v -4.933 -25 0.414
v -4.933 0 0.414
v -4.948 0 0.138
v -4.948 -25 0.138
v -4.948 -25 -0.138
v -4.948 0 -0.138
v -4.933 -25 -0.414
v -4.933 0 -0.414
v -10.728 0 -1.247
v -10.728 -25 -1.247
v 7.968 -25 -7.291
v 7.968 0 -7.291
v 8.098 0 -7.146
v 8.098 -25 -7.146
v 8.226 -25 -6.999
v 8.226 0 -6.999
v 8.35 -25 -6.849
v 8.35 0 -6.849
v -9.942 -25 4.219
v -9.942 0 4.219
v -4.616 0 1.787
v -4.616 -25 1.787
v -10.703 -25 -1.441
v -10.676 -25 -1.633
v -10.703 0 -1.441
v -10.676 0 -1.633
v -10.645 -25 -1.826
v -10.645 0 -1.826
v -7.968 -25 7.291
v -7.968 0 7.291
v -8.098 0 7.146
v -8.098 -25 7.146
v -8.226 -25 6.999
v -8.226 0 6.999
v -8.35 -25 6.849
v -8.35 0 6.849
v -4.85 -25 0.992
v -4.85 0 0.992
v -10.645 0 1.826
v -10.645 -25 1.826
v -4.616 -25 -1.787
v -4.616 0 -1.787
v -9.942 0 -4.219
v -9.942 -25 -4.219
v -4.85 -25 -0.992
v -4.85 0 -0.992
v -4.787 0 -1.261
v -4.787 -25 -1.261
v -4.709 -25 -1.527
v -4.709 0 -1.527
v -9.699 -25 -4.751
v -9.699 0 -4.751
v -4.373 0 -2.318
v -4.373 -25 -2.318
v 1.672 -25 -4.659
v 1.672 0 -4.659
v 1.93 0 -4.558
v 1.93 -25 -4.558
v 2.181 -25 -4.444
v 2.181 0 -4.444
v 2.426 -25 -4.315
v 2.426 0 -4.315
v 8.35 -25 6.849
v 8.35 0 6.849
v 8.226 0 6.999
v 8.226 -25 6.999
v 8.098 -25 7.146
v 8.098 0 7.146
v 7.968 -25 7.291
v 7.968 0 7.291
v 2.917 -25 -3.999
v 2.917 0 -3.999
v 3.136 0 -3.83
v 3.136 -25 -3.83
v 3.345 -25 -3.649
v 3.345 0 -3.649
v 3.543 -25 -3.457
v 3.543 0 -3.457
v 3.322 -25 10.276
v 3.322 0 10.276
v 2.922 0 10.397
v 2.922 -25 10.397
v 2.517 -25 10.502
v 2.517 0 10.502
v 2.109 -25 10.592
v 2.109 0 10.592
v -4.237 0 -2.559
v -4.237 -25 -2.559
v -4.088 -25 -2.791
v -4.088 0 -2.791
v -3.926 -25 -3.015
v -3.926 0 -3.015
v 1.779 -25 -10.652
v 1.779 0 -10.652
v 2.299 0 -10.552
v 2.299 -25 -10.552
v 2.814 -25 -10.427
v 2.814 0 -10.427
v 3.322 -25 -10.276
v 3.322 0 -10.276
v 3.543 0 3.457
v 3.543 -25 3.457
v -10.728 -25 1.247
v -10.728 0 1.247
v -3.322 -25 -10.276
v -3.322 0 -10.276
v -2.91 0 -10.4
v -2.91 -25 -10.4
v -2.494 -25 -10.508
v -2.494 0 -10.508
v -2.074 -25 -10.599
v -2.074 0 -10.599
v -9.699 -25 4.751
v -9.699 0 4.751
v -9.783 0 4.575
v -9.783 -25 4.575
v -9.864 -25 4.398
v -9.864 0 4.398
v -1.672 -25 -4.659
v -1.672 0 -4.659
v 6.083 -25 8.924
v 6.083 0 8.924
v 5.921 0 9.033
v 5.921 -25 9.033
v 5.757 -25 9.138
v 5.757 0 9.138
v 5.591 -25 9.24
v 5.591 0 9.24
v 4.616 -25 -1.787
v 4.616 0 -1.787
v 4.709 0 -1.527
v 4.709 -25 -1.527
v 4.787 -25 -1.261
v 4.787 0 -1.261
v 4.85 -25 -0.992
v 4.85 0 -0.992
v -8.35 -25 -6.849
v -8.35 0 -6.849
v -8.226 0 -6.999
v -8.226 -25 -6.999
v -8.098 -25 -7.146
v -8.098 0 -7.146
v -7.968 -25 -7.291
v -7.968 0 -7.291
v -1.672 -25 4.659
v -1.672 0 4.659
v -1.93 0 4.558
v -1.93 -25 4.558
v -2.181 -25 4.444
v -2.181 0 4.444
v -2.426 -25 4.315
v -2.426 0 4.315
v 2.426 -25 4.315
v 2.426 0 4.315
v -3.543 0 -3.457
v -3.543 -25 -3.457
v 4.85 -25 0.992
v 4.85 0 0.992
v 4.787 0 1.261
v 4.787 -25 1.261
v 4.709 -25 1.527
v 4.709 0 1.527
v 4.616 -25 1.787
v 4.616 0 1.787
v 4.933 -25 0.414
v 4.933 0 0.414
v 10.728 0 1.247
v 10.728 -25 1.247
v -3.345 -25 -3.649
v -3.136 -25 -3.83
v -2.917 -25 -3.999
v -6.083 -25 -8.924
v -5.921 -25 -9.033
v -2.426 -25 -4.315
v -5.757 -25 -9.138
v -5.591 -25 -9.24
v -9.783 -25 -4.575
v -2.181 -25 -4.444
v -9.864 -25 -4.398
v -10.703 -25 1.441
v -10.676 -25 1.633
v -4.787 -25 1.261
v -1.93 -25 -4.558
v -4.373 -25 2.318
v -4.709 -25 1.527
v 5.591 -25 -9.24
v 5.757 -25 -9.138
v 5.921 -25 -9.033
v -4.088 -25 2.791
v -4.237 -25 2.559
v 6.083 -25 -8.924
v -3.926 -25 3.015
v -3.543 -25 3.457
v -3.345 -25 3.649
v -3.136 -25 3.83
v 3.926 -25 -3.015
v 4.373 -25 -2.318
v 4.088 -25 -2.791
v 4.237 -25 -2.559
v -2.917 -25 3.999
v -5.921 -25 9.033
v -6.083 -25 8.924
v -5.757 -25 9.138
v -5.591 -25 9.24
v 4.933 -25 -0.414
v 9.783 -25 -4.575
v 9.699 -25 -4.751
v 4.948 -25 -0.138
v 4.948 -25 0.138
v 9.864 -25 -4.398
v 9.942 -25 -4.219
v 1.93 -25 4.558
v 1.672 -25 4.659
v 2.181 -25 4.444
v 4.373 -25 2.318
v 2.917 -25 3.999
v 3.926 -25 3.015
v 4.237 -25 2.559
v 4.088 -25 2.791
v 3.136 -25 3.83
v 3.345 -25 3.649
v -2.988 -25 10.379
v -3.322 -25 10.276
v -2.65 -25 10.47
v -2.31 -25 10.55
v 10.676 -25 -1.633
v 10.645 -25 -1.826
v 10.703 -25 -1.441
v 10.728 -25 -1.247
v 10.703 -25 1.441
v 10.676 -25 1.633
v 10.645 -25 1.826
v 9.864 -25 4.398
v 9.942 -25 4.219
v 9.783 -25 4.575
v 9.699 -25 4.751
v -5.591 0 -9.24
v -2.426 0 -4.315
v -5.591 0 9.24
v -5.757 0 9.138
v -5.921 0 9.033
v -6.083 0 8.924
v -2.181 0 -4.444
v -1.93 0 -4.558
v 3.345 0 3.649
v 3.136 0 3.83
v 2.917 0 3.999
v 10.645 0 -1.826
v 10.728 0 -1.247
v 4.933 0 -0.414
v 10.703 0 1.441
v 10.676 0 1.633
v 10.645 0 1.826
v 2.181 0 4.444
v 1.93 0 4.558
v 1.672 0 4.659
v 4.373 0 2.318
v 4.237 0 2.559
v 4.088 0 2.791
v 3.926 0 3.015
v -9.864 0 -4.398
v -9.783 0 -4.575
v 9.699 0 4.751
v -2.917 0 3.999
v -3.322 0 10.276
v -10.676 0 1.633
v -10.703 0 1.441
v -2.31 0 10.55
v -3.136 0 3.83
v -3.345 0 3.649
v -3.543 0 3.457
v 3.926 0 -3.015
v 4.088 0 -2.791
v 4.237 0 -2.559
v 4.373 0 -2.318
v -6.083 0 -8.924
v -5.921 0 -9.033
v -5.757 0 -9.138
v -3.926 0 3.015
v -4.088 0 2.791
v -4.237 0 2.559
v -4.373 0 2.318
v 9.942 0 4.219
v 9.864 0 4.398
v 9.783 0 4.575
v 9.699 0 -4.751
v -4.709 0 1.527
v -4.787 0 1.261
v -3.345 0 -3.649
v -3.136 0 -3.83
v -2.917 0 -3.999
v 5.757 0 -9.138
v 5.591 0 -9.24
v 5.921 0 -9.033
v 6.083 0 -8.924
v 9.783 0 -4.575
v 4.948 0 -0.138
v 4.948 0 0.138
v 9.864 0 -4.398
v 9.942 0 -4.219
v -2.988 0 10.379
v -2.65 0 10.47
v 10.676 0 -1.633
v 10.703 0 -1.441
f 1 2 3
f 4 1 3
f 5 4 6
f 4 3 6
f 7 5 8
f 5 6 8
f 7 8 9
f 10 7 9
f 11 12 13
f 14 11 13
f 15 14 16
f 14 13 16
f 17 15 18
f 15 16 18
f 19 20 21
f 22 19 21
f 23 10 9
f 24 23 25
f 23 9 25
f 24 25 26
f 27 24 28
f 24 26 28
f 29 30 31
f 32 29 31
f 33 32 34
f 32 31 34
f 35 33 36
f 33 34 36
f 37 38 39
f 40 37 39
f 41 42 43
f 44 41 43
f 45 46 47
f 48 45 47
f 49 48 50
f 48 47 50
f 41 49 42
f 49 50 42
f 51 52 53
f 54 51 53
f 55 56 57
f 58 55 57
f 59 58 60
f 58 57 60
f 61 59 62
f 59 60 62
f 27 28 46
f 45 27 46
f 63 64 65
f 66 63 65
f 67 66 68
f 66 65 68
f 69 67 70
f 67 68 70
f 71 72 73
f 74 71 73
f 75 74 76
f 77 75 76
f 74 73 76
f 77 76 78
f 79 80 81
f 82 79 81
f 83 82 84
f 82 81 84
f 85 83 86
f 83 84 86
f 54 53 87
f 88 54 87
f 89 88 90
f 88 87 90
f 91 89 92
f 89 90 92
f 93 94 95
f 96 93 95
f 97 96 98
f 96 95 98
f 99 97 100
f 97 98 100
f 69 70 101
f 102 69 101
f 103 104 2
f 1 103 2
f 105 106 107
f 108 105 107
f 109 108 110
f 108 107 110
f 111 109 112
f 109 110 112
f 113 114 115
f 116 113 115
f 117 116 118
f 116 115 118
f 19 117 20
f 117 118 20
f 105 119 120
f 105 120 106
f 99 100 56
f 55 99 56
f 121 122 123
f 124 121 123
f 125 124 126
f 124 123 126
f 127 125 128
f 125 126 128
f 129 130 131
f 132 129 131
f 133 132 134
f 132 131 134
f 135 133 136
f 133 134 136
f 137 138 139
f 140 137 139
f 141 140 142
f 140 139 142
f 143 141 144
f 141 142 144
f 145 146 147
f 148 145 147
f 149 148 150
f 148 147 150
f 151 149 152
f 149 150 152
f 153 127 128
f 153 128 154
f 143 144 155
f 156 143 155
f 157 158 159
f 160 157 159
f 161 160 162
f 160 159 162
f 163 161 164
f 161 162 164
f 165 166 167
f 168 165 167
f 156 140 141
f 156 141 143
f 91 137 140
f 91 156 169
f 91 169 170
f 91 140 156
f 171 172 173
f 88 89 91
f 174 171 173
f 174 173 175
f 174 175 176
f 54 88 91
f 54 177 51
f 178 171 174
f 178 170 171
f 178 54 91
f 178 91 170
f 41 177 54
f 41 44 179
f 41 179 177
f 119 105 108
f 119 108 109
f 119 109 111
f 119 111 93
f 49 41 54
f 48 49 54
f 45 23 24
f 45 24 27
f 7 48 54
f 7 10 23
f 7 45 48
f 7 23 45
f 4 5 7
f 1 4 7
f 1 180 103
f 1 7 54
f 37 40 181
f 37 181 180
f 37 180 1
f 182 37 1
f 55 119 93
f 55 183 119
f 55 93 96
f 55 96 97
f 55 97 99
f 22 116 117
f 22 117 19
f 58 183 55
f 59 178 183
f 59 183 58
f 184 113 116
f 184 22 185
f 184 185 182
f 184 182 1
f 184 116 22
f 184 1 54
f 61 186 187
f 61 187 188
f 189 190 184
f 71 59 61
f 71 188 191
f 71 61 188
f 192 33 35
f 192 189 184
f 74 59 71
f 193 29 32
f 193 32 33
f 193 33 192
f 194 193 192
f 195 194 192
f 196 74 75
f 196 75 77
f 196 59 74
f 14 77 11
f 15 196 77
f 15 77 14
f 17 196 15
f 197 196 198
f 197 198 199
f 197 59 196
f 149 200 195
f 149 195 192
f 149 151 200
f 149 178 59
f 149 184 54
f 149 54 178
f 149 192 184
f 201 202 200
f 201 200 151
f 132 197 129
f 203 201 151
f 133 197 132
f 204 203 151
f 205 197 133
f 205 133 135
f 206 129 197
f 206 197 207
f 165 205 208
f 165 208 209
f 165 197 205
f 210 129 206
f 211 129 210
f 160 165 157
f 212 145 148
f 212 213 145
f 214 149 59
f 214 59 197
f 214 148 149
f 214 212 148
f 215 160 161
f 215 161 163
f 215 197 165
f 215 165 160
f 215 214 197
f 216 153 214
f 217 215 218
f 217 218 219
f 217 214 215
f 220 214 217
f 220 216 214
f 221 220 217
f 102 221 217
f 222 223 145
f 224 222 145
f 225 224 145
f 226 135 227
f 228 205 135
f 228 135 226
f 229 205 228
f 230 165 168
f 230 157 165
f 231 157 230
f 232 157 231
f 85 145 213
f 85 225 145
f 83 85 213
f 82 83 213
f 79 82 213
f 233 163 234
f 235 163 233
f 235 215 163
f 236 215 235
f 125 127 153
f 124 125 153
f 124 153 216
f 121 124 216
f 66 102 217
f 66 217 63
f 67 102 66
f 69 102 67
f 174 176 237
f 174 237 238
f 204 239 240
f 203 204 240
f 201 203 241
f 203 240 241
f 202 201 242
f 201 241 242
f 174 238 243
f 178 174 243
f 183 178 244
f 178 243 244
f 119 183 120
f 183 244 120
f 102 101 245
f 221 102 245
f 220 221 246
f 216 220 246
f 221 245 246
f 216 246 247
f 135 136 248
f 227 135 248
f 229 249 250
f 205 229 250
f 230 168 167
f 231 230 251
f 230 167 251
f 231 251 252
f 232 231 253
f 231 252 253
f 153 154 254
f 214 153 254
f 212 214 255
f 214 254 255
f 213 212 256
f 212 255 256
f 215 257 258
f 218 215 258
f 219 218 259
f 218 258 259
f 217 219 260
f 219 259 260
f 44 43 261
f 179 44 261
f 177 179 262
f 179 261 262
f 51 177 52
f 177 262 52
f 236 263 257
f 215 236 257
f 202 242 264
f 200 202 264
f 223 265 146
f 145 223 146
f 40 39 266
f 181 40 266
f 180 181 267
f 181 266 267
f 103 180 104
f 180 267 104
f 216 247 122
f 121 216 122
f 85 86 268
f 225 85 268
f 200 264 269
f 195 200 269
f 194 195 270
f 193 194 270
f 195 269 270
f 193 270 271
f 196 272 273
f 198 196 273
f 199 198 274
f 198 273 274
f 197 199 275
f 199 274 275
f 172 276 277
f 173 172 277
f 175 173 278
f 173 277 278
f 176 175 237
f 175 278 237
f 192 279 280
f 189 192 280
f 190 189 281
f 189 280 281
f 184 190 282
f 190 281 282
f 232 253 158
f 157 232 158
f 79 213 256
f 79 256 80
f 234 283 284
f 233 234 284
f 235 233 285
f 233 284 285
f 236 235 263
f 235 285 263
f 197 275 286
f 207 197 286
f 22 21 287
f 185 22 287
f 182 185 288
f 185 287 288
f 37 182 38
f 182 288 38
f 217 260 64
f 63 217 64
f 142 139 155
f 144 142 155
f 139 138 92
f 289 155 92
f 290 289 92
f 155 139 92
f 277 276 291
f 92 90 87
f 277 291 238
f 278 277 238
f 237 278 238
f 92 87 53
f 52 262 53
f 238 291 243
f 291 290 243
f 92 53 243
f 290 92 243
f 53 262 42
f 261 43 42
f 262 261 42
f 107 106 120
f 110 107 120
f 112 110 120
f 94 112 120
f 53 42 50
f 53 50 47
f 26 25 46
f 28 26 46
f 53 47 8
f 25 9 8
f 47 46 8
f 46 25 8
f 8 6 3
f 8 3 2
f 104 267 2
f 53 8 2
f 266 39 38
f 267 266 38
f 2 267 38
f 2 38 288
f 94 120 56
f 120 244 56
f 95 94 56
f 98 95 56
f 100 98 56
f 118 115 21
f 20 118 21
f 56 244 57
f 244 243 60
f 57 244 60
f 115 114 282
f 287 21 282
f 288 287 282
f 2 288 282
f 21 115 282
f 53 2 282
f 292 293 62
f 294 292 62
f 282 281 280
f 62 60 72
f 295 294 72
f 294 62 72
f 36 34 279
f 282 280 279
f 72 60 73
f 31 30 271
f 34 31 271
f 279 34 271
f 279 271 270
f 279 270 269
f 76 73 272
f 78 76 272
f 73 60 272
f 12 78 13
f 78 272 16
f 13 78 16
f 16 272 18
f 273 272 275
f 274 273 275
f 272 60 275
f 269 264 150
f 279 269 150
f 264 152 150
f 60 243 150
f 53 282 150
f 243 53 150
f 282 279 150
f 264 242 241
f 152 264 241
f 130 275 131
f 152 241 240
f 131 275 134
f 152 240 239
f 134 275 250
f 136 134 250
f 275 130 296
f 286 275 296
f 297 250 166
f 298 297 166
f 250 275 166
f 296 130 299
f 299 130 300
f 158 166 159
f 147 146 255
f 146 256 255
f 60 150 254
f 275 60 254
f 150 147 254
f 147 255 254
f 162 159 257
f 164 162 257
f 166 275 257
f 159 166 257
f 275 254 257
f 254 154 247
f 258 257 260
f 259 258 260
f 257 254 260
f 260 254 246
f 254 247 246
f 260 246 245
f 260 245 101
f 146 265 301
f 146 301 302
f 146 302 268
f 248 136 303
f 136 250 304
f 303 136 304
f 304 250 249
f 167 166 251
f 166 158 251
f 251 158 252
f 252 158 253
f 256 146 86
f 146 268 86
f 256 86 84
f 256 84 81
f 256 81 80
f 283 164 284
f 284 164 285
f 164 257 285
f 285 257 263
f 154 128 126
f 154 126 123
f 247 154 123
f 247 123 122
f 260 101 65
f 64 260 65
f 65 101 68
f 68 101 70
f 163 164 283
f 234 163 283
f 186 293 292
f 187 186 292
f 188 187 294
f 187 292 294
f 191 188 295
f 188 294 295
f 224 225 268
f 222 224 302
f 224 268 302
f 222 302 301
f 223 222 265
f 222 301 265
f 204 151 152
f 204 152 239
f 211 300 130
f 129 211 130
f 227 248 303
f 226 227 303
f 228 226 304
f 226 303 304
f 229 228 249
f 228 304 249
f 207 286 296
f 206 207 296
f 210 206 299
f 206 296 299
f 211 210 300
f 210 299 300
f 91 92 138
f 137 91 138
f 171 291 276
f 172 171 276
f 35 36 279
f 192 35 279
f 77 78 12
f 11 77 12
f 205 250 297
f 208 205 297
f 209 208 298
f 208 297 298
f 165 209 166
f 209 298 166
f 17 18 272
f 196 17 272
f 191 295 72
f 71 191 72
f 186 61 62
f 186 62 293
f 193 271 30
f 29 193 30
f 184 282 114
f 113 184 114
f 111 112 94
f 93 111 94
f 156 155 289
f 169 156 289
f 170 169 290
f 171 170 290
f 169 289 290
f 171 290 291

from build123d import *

# Parameters (mm, degrees)
F1_DEPTH = 25


with BuildPart() as f1:
    # F0 (on Front) → F1 (new body)
    with BuildSketch(Plane.XZ):
        with BuildLine():
            Line((-2.425778, 4.31487), (-5.591055, 9.240136))
            ThreePointArc((-5.591055, 9.240136), (-5.838921, 9.085538), (-6.082515, 8.924293))
            Line((-6.082515, 8.924293), (-2.917239, 3.999027))
            ThreePointArc((-2.917239, 3.999027), (-3.241561, 3.74096), (-3.543157, 3.456666))
            Line((-3.543157, 3.456666), (-7.967825, 7.290663))
            ThreePointArc((-7.967825, 7.290663), (-8.162095, 7.072496), (-8.350394, 6.849154))
            Line((-8.350394, 6.849154), (-3.925726, 3.015157))
            ThreePointArc((-3.925726, 3.015157), (-4.164205, 2.676172), (-4.373489, 2.318424))
            Line((-4.373489, 2.318424), (-9.699089, 4.750544))
            ThreePointArc((-9.699089, 4.750544), (-9.824026, 4.486482), (-9.941774, 4.219137))
            Line((-9.941774, 4.219137), (-4.616175, 1.787017))
            ThreePointArc((-4.616175, 1.787017), (-4.74949, 1.394576), (-4.849508, 0.992358))
            Line((-4.849508, 0.992358), (-10.644591, 1.825565))
            ThreePointArc((-10.644591, 1.825565), (-10.690072, 1.537), (-10.727731, 1.247311))
            Line((-10.727731, 1.247311), (-4.932648, 0.414104))
            ThreePointArc((-4.932648, 0.414104), (-4.95, 0), (-4.932648, -0.414104))
            Line((-4.932648, -0.414104), (-10.727731, -1.247311))
            ThreePointArc((-10.727731, -1.247311), (-10.690072, -1.537), (-10.644591, -1.825565))
            Line((-10.644591, -1.825565), (-4.849508, -0.992358))
            ThreePointArc((-4.849508, -0.992358), (-4.74949, -1.394576), (-4.616175, -1.787017))
            Line((-4.616175, -1.787017), (-9.941774, -4.219137))
            ThreePointArc((-9.941774, -4.219137), (-9.824026, -4.486482), (-9.699089, -4.750544))
            Line((-9.699089, -4.750544), (-4.373489, -2.318424))
            ThreePointArc((-4.373489, -2.318424), (-4.164205, -2.676172), (-3.925726, -3.015157))
            Line((-3.925726, -3.015157), (-8.350394, -6.849154))
            ThreePointArc((-8.350394, -6.849154), (-8.162095, -7.072496), (-7.967825, -7.290663))
            Line((-7.967825, -7.290663), (-3.543157, -3.456666))
            ThreePointArc((-3.543157, -3.456666), (-3.241561, -3.74096), (-2.917239, -3.999027))
            Line((-2.917239, -3.999027), (-6.082515, -8.924293))
            ThreePointArc((-6.082515, -8.924293), (-5.838921, -9.085538), (-5.591055, -9.240136))
            Line((-5.591055, -9.240136), (-2.425778, -4.31487))
            ThreePointArc((-2.425778, -4.31487), (-2.056304, -4.502678), (-1.672414, -4.65892))
            Line((-1.672414, -4.65892), (-3.321866, -10.276439))
            ThreePointArc((-3.321866, -10.276439), (-2.702728, -10.45635), (-2.073957, -10.598995))
            Line((-2.073957, -10.598995), (1.778874, -10.652493))
            ThreePointArc((1.778874, -10.652493), (2.557292, -10.492867), (3.321866, -10.276439))
            Line((3.321866, -10.276439), (1.672414, -4.65892))
            ThreePointArc((1.672414, -4.65892), (2.056304, -4.502678), (2.425778, -4.31487))
            Line((2.425778, -4.31487), (5.591055, -9.240136))
            ThreePointArc((5.591055, -9.240136), (5.838921, -9.085538), (6.082515, -8.924293))
            Line((6.082515, -8.924293), (2.917239, -3.999027))
            ThreePointArc((2.917239, -3.999027), (3.241561, -3.74096), (3.543157, -3.456666))
            Line((3.543157, -3.456666), (7.967825, -7.290663))
            ThreePointArc((7.967825, -7.290663), (8.162095, -7.072496), (8.350394, -6.849154))
            Line((8.350394, -6.849154), (3.925726, -3.015157))
            ThreePointArc((3.925726, -3.015157), (4.164205, -2.676172), (4.373489, -2.318424))
            Line((4.373489, -2.318424), (9.699089, -4.750544))
            ThreePointArc((9.699089, -4.750544), (9.824026, -4.486482), (9.941774, -4.219137))
            Line((9.941774, -4.219137), (4.616175, -1.787017))
            ThreePointArc((4.616175, -1.787017), (4.74949, -1.394576), (4.849508, -0.992358))
            Line((4.849508, -0.992358), (10.644591, -1.825565))
            ThreePointArc((10.644591, -1.825565), (10.690072, -1.537), (10.727731, -1.247311))
            Line((10.727731, -1.247311), (4.932648, -0.414104))
            ThreePointArc((4.932648, -0.414104), (4.95, 0), (4.932648, 0.414104))
            Line((4.932648, 0.414104), (10.727731, 1.247311))
            ThreePointArc((10.727731, 1.247311), (10.690072, 1.537), (10.644591, 1.825565))
            Line((10.644591, 1.825565), (4.849508, 0.992358))
            ThreePointArc((4.849508, 0.992358), (4.74949, 1.394576), (4.616175, 1.787017))
            Line((4.616175, 1.787017), (9.941774, 4.219137))
            ThreePointArc((9.941774, 4.219137), (9.824026, 4.486482), (9.699089, 4.750544))
            Line((9.699089, 4.750544), (4.373489, 2.318424))
            ThreePointArc((4.373489, 2.318424), (4.164205, 2.676172), (3.925726, 3.015157))
            Line((3.925726, 3.015157), (8.350394, 6.849154))
            ThreePointArc((8.350394, 6.849154), (8.162095, 7.072496), (7.967825, 7.290663))
            Line((7.967825, 7.290663), (3.543157, 3.456666))
            ThreePointArc((3.543157, 3.456666), (3.241561, 3.74096), (2.917239, 3.999027))
            Line((2.917239, 3.999027), (6.082515, 8.924293))
            ThreePointArc((6.082515, 8.924293), (5.838921, 9.085538), (5.591055, 9.240136))
            Line((5.591055, 9.240136), (2.425778, 4.31487))
            ThreePointArc((2.425778, 4.31487), (2.056304, 4.502678), (1.672414, 4.65892))
            Line((1.672414, 4.65892), (3.321866, 10.276439))
            ThreePointArc((3.321866, 10.276439), (2.720175, 10.451825), (2.109323, 10.592014))
            Line((2.109323, 10.592014), (-2.310303, 10.55))
            ThreePointArc((-2.310303, 10.55), (-2.819405, 10.425496), (-3.321866, 10.276439))
            Line((-3.321866, 10.276439), (-1.672414, 4.65892))
            ThreePointArc((-1.672414, 4.65892), (-2.056304, 4.502678), (-2.425778, 4.31487))
        make_face()
    extrude(amount=F1_DEPTH)


solid = f1.part
